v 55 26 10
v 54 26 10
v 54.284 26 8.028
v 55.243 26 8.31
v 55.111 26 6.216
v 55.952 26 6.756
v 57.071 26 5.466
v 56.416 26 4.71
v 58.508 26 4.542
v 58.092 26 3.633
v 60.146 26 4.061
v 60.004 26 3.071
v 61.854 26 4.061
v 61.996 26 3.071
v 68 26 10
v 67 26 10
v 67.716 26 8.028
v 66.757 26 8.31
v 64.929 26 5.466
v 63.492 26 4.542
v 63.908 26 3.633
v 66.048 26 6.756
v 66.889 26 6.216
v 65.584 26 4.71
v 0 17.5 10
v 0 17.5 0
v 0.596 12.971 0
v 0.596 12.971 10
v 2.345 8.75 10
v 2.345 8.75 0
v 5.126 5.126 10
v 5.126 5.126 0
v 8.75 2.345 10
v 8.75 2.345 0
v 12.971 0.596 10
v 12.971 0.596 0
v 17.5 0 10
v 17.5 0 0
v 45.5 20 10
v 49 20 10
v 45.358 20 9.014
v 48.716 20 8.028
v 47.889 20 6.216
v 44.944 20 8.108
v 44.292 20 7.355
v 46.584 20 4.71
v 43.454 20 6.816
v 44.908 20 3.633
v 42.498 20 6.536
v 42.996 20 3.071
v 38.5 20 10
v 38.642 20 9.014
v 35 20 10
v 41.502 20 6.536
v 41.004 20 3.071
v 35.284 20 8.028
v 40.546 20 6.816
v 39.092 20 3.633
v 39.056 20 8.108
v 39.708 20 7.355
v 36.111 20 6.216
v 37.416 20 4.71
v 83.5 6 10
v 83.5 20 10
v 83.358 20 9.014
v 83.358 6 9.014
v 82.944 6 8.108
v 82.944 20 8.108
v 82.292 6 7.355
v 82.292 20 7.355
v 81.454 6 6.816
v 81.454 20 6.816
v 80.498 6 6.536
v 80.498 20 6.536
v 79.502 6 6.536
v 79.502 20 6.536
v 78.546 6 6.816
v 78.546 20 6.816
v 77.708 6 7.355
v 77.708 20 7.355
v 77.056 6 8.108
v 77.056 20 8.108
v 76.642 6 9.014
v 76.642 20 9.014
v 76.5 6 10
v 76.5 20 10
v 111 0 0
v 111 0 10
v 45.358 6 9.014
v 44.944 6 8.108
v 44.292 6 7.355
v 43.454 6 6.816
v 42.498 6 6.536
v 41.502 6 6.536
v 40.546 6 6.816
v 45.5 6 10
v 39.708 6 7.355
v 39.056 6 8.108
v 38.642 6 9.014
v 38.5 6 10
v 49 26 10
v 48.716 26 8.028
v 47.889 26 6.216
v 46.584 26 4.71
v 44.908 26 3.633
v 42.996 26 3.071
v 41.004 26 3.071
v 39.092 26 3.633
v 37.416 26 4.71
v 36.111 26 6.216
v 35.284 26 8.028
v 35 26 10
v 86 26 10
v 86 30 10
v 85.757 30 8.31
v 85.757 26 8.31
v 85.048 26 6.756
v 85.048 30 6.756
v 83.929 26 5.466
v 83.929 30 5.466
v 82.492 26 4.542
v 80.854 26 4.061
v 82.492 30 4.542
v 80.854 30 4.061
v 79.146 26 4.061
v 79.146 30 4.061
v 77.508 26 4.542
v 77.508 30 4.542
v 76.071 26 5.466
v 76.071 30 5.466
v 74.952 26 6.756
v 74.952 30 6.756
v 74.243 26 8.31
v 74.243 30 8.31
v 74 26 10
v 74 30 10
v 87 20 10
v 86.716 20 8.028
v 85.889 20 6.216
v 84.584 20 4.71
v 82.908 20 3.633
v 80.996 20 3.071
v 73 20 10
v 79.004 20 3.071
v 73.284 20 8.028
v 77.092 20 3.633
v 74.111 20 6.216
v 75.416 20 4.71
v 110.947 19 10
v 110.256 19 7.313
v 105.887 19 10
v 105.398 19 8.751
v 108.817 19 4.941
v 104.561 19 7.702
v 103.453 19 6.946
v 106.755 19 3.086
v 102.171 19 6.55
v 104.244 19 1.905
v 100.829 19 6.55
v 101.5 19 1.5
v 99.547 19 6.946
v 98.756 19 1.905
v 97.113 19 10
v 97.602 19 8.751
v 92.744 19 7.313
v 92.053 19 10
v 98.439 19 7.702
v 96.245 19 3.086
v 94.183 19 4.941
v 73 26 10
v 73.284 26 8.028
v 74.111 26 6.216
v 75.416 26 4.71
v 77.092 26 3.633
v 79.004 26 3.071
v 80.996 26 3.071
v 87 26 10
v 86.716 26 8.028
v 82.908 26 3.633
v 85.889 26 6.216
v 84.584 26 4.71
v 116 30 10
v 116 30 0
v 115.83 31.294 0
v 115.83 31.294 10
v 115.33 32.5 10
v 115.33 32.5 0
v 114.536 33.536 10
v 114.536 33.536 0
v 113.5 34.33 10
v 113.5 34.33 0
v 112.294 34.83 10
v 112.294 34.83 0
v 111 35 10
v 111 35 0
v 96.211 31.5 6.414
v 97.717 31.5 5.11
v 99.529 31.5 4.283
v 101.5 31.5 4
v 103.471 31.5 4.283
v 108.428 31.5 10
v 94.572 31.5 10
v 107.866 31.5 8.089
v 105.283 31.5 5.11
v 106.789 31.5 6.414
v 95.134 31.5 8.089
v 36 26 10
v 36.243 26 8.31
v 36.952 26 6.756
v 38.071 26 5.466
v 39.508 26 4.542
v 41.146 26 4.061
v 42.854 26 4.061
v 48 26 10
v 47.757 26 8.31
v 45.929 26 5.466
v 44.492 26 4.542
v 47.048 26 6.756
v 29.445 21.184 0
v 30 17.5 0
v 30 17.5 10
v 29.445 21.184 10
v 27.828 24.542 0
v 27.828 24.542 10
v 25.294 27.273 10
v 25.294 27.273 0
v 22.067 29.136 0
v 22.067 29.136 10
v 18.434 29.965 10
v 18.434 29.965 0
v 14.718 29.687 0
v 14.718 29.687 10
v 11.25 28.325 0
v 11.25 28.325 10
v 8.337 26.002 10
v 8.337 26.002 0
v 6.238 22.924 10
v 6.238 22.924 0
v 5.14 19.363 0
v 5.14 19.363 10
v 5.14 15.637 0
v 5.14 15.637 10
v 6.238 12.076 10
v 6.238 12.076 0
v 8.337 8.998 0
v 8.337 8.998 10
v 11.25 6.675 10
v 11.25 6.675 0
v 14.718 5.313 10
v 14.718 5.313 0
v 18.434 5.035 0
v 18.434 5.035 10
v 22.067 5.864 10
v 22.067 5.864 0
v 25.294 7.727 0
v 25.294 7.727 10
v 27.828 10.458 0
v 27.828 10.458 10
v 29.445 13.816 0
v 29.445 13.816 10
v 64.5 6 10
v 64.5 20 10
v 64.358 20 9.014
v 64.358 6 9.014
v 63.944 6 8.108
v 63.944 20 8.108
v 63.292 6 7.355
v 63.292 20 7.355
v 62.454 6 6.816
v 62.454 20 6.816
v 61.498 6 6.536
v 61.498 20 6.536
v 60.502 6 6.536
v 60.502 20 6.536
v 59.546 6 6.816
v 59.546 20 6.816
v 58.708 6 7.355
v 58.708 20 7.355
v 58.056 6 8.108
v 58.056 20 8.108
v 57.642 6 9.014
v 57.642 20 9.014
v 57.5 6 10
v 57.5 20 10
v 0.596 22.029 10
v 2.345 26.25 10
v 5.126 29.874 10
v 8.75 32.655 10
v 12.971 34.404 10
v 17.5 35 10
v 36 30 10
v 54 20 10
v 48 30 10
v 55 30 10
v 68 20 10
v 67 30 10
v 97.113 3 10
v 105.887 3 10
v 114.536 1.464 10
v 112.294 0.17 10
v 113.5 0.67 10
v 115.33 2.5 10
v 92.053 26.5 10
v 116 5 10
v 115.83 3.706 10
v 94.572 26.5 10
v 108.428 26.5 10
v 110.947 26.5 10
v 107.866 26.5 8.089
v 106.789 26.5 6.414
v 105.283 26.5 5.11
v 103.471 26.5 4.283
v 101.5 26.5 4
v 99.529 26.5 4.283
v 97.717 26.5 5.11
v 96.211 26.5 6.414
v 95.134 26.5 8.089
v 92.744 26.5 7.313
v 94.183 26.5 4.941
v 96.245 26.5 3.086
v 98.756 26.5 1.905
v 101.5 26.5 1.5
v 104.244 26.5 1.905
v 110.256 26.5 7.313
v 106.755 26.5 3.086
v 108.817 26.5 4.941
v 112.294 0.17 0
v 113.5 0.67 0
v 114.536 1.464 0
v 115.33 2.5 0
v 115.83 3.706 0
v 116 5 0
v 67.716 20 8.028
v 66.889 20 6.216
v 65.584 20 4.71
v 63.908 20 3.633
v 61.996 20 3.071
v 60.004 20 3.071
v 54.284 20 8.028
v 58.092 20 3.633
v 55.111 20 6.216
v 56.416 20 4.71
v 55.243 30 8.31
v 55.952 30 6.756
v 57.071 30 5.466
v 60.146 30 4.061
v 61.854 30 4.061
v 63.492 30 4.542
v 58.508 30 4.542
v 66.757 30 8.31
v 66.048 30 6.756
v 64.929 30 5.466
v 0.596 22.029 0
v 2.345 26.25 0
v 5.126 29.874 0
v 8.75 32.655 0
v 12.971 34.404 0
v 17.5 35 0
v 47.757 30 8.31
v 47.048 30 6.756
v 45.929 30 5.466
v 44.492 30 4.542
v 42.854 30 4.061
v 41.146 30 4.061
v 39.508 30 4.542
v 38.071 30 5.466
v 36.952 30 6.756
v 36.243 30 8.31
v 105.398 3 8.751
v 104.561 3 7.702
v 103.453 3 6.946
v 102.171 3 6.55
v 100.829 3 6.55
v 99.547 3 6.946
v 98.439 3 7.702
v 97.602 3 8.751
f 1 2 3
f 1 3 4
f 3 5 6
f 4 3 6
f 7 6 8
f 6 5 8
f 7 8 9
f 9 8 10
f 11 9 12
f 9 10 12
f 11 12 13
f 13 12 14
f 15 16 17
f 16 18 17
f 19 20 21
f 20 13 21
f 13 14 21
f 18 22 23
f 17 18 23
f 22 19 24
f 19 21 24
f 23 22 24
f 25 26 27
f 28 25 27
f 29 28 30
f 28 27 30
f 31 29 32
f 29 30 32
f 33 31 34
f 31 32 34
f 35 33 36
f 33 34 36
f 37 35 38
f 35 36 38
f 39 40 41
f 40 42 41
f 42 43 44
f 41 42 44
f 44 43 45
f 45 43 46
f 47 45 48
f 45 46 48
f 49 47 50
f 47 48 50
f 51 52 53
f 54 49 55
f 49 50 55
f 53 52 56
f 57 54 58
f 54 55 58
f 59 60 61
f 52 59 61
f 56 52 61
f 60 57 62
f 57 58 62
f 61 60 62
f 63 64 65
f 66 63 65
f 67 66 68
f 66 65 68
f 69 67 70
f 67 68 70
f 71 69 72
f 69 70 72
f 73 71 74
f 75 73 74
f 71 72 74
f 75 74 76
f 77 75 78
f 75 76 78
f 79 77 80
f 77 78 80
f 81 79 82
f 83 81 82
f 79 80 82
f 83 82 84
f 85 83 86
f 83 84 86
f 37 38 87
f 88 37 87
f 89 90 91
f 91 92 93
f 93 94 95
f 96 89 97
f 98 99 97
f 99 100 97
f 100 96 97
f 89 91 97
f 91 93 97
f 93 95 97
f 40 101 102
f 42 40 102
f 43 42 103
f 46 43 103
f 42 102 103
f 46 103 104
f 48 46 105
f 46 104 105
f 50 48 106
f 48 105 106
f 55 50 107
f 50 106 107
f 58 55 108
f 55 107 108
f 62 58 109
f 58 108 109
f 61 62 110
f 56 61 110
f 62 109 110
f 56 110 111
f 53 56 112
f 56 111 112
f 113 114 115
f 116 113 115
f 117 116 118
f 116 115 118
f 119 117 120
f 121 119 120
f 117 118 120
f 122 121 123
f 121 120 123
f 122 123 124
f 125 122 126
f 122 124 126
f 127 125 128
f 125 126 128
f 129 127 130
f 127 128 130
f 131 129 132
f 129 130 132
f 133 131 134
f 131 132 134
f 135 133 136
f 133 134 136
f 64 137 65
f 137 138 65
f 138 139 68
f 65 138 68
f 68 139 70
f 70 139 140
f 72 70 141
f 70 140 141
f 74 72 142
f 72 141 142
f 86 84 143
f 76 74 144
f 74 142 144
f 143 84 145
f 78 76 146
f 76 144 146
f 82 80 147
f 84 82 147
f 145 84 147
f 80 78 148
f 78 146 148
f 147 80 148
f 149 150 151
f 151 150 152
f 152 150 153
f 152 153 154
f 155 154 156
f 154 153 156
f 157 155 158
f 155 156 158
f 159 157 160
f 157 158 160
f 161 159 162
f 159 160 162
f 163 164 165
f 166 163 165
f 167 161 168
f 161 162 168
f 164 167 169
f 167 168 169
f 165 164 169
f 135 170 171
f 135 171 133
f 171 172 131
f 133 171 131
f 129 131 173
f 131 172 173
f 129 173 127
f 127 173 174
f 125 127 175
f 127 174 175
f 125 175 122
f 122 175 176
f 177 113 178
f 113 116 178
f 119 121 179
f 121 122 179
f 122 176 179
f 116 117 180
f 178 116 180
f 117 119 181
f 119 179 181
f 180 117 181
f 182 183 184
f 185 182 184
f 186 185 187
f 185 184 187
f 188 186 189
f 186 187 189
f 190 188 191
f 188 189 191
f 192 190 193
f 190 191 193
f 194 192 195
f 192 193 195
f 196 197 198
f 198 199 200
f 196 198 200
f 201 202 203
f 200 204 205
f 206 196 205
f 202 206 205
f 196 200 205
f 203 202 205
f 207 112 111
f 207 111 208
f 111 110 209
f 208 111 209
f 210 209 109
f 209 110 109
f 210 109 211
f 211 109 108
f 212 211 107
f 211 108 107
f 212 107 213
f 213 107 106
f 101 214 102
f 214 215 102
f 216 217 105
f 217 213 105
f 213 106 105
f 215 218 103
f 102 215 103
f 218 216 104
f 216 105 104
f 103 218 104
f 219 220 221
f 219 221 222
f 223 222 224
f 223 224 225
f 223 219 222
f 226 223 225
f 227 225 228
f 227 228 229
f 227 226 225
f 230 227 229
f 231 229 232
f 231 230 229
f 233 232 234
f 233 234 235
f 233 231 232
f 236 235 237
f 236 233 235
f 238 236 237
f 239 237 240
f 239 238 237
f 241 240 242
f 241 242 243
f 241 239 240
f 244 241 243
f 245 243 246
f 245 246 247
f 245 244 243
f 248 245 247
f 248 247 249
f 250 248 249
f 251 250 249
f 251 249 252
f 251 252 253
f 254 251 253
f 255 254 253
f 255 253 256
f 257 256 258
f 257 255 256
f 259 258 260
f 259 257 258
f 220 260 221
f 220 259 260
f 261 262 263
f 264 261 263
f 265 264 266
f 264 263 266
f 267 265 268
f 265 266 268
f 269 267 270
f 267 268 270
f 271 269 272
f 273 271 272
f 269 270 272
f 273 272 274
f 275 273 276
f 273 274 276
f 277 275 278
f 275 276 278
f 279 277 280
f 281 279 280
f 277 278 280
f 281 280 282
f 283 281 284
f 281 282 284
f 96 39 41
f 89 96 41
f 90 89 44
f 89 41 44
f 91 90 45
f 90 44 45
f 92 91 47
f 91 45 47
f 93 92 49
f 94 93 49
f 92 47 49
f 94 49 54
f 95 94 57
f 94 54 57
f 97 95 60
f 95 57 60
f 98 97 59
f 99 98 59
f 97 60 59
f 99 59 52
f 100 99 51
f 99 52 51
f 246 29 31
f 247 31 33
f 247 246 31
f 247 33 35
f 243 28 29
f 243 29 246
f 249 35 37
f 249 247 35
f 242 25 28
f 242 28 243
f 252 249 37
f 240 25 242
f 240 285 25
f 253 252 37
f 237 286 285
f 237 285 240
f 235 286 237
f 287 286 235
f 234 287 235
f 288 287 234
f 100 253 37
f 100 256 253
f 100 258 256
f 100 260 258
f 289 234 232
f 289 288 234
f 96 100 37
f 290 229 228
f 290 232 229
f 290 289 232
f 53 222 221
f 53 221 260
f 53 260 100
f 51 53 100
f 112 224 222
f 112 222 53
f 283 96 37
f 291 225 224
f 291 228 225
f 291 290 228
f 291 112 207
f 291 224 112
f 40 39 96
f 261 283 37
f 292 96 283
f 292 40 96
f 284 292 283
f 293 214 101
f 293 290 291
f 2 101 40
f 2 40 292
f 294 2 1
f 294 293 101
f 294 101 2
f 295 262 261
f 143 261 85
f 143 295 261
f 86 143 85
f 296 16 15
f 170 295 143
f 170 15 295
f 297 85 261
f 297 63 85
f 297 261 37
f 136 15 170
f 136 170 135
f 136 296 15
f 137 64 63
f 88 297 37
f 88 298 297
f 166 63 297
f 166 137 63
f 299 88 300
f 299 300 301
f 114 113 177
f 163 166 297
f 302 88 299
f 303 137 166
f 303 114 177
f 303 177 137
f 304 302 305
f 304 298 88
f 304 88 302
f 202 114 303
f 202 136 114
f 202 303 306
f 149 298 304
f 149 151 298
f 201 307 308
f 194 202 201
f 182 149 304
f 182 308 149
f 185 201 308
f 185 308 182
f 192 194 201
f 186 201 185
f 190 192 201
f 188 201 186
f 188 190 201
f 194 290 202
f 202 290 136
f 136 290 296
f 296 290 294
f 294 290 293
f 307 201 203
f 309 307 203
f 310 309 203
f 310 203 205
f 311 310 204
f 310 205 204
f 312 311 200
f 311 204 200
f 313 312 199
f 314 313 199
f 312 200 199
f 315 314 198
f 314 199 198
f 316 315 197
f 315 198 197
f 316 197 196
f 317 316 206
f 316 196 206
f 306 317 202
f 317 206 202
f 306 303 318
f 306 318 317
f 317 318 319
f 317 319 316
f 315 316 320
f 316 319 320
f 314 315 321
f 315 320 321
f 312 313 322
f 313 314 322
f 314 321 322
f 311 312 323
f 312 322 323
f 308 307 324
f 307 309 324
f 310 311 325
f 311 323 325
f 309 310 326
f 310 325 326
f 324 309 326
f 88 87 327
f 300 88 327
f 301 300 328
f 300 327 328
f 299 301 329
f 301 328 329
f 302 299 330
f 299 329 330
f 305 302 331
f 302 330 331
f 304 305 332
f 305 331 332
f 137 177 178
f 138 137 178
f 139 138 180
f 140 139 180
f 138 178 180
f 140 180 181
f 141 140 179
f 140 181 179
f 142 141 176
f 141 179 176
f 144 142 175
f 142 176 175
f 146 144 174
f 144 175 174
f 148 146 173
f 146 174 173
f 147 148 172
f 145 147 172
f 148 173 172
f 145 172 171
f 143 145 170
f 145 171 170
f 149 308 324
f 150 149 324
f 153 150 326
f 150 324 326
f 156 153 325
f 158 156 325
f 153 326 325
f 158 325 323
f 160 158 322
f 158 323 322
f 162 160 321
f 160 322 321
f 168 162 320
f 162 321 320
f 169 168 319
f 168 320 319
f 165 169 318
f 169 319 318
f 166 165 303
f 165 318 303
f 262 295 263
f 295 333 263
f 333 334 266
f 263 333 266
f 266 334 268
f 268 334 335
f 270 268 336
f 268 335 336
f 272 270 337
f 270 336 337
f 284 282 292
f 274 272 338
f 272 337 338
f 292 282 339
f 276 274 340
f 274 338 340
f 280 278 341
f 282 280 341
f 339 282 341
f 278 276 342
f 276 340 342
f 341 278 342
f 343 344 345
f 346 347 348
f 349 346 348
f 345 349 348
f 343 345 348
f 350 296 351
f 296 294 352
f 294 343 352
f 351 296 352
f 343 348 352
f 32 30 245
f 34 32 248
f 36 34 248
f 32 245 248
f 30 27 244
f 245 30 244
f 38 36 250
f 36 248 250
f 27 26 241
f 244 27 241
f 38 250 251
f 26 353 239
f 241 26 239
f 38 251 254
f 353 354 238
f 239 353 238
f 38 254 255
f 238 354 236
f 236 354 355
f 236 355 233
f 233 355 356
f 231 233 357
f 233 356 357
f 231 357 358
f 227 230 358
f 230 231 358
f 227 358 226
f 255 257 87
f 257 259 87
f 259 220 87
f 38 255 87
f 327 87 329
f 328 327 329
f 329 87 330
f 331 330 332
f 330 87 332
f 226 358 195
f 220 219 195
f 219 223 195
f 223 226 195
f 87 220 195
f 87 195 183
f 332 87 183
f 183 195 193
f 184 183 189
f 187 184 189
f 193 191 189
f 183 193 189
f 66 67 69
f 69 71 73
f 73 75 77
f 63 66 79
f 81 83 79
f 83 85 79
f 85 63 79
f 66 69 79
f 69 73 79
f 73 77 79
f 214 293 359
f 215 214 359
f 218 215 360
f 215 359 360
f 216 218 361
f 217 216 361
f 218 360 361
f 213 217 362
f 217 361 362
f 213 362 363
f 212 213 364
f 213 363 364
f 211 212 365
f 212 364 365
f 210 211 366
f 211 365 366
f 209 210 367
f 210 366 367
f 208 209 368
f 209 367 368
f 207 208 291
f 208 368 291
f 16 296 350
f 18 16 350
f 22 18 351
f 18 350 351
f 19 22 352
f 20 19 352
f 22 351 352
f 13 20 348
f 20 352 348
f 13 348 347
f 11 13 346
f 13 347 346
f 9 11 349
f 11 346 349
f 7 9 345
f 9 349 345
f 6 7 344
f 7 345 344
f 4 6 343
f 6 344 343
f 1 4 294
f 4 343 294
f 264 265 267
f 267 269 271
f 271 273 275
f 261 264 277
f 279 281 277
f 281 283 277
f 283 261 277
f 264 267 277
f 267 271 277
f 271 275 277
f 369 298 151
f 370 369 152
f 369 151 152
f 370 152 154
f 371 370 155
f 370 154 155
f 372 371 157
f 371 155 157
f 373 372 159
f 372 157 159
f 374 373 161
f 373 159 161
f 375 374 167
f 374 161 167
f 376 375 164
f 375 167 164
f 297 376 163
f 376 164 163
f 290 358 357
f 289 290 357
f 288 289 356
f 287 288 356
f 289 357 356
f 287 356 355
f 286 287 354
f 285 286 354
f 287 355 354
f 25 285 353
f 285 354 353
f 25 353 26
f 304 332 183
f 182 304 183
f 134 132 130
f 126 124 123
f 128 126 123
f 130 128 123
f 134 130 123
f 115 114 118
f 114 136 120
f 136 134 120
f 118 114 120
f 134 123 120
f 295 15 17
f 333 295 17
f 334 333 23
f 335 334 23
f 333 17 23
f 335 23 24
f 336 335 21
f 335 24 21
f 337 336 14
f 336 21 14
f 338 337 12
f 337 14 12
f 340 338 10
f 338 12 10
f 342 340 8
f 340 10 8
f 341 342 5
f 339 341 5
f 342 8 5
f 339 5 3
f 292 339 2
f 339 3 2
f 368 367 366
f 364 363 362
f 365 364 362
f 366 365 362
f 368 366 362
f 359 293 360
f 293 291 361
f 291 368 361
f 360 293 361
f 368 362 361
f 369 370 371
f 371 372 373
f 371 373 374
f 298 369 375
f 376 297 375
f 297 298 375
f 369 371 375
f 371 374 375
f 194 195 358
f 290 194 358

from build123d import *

# Parameters (mm, degrees)
F0_R     = 12.5
F1_DEPTH = 10


with BuildPart() as f1:
    # F0 (on Top) → F1 (new body)
    with BuildSketch(Plane.XY):
        with BuildLine():
            ThreePointArc((0, 17.5), (5.1256313292, 5.1256313292), (17.5, 0))
            Line((17.5, 0), (111, 0))
            ThreePointArc((111, 0), (114.5355339059, 1.4644660941), (116, 5))
            Line((116, 5), (116, 30))
            ThreePointArc((116, 30), (114.5355339059, 33.5355339059), (111, 35))
            Line((111, 35), (17.5, 35))
            ThreePointArc((17.5, 35), (5.1256313292, 29.8743686708), (0, 17.5))
        make_face()
        with Locations((17.5, 17.5)):
            Circle(F0_R, mode=Mode.SUBTRACT)
    extrude(amount=F1_DEPTH)

    # F2 (on face) → F3 (revolve, cut)
    with BuildSketch(Plane.XY.offset(10)):
        Polygon((42, 20), (42, 6), (45.5, 6), (45.5, 20), (49, 20), (49, 26), (48, 26), (48, 30), (42, 30), (42, 26), align=None)
    revolve(axis=Axis((42, 13, 10), (0, 1, 0)), mode=Mode.SUBTRACT)

    # F2 (on face) → F4 (revolve, cut)
    with BuildSketch(Plane.XY.offset(10)):
        Polygon((61, 20), (61, 6), (64.5, 6), (64.5, 20), (68, 20), (68, 26), (67, 26), (67, 30), (61, 30), (61, 26), align=None)
    revolve(axis=Axis((61, 13, 10), (0, 1, 0)), mode=Mode.SUBTRACT)

    # F2 (on face) → F5 (revolve, cut)
    with BuildSketch(Plane.XY.offset(10)):
        Polygon((80, 20), (80, 6), (83.5, 6), (83.5, 20), (87, 20), (87, 26), (86, 26), (86, 30), (80, 30), (80, 26), align=None)
    revolve(axis=Axis((80, 13, 10), (0, 1, 0)), mode=Mode.SUBTRACT)

    # F7 (on offset) → F8 (revolve, cut)
    with BuildSketch(Plane.XY.offset(11)):
        Polygon((101.5, 19), (101.5, 3), (106, 3), (106, 19), (111, 19), (111, 26.5), (108.5, 26.5), (108.5, 31.5), (101.5, 31.5), (101.5, 26.5), align=None)
    revolve(axis=Axis((101.5, 11, 11), (0, 1, 0)), mode=Mode.SUBTRACT)


solid = f1.part
